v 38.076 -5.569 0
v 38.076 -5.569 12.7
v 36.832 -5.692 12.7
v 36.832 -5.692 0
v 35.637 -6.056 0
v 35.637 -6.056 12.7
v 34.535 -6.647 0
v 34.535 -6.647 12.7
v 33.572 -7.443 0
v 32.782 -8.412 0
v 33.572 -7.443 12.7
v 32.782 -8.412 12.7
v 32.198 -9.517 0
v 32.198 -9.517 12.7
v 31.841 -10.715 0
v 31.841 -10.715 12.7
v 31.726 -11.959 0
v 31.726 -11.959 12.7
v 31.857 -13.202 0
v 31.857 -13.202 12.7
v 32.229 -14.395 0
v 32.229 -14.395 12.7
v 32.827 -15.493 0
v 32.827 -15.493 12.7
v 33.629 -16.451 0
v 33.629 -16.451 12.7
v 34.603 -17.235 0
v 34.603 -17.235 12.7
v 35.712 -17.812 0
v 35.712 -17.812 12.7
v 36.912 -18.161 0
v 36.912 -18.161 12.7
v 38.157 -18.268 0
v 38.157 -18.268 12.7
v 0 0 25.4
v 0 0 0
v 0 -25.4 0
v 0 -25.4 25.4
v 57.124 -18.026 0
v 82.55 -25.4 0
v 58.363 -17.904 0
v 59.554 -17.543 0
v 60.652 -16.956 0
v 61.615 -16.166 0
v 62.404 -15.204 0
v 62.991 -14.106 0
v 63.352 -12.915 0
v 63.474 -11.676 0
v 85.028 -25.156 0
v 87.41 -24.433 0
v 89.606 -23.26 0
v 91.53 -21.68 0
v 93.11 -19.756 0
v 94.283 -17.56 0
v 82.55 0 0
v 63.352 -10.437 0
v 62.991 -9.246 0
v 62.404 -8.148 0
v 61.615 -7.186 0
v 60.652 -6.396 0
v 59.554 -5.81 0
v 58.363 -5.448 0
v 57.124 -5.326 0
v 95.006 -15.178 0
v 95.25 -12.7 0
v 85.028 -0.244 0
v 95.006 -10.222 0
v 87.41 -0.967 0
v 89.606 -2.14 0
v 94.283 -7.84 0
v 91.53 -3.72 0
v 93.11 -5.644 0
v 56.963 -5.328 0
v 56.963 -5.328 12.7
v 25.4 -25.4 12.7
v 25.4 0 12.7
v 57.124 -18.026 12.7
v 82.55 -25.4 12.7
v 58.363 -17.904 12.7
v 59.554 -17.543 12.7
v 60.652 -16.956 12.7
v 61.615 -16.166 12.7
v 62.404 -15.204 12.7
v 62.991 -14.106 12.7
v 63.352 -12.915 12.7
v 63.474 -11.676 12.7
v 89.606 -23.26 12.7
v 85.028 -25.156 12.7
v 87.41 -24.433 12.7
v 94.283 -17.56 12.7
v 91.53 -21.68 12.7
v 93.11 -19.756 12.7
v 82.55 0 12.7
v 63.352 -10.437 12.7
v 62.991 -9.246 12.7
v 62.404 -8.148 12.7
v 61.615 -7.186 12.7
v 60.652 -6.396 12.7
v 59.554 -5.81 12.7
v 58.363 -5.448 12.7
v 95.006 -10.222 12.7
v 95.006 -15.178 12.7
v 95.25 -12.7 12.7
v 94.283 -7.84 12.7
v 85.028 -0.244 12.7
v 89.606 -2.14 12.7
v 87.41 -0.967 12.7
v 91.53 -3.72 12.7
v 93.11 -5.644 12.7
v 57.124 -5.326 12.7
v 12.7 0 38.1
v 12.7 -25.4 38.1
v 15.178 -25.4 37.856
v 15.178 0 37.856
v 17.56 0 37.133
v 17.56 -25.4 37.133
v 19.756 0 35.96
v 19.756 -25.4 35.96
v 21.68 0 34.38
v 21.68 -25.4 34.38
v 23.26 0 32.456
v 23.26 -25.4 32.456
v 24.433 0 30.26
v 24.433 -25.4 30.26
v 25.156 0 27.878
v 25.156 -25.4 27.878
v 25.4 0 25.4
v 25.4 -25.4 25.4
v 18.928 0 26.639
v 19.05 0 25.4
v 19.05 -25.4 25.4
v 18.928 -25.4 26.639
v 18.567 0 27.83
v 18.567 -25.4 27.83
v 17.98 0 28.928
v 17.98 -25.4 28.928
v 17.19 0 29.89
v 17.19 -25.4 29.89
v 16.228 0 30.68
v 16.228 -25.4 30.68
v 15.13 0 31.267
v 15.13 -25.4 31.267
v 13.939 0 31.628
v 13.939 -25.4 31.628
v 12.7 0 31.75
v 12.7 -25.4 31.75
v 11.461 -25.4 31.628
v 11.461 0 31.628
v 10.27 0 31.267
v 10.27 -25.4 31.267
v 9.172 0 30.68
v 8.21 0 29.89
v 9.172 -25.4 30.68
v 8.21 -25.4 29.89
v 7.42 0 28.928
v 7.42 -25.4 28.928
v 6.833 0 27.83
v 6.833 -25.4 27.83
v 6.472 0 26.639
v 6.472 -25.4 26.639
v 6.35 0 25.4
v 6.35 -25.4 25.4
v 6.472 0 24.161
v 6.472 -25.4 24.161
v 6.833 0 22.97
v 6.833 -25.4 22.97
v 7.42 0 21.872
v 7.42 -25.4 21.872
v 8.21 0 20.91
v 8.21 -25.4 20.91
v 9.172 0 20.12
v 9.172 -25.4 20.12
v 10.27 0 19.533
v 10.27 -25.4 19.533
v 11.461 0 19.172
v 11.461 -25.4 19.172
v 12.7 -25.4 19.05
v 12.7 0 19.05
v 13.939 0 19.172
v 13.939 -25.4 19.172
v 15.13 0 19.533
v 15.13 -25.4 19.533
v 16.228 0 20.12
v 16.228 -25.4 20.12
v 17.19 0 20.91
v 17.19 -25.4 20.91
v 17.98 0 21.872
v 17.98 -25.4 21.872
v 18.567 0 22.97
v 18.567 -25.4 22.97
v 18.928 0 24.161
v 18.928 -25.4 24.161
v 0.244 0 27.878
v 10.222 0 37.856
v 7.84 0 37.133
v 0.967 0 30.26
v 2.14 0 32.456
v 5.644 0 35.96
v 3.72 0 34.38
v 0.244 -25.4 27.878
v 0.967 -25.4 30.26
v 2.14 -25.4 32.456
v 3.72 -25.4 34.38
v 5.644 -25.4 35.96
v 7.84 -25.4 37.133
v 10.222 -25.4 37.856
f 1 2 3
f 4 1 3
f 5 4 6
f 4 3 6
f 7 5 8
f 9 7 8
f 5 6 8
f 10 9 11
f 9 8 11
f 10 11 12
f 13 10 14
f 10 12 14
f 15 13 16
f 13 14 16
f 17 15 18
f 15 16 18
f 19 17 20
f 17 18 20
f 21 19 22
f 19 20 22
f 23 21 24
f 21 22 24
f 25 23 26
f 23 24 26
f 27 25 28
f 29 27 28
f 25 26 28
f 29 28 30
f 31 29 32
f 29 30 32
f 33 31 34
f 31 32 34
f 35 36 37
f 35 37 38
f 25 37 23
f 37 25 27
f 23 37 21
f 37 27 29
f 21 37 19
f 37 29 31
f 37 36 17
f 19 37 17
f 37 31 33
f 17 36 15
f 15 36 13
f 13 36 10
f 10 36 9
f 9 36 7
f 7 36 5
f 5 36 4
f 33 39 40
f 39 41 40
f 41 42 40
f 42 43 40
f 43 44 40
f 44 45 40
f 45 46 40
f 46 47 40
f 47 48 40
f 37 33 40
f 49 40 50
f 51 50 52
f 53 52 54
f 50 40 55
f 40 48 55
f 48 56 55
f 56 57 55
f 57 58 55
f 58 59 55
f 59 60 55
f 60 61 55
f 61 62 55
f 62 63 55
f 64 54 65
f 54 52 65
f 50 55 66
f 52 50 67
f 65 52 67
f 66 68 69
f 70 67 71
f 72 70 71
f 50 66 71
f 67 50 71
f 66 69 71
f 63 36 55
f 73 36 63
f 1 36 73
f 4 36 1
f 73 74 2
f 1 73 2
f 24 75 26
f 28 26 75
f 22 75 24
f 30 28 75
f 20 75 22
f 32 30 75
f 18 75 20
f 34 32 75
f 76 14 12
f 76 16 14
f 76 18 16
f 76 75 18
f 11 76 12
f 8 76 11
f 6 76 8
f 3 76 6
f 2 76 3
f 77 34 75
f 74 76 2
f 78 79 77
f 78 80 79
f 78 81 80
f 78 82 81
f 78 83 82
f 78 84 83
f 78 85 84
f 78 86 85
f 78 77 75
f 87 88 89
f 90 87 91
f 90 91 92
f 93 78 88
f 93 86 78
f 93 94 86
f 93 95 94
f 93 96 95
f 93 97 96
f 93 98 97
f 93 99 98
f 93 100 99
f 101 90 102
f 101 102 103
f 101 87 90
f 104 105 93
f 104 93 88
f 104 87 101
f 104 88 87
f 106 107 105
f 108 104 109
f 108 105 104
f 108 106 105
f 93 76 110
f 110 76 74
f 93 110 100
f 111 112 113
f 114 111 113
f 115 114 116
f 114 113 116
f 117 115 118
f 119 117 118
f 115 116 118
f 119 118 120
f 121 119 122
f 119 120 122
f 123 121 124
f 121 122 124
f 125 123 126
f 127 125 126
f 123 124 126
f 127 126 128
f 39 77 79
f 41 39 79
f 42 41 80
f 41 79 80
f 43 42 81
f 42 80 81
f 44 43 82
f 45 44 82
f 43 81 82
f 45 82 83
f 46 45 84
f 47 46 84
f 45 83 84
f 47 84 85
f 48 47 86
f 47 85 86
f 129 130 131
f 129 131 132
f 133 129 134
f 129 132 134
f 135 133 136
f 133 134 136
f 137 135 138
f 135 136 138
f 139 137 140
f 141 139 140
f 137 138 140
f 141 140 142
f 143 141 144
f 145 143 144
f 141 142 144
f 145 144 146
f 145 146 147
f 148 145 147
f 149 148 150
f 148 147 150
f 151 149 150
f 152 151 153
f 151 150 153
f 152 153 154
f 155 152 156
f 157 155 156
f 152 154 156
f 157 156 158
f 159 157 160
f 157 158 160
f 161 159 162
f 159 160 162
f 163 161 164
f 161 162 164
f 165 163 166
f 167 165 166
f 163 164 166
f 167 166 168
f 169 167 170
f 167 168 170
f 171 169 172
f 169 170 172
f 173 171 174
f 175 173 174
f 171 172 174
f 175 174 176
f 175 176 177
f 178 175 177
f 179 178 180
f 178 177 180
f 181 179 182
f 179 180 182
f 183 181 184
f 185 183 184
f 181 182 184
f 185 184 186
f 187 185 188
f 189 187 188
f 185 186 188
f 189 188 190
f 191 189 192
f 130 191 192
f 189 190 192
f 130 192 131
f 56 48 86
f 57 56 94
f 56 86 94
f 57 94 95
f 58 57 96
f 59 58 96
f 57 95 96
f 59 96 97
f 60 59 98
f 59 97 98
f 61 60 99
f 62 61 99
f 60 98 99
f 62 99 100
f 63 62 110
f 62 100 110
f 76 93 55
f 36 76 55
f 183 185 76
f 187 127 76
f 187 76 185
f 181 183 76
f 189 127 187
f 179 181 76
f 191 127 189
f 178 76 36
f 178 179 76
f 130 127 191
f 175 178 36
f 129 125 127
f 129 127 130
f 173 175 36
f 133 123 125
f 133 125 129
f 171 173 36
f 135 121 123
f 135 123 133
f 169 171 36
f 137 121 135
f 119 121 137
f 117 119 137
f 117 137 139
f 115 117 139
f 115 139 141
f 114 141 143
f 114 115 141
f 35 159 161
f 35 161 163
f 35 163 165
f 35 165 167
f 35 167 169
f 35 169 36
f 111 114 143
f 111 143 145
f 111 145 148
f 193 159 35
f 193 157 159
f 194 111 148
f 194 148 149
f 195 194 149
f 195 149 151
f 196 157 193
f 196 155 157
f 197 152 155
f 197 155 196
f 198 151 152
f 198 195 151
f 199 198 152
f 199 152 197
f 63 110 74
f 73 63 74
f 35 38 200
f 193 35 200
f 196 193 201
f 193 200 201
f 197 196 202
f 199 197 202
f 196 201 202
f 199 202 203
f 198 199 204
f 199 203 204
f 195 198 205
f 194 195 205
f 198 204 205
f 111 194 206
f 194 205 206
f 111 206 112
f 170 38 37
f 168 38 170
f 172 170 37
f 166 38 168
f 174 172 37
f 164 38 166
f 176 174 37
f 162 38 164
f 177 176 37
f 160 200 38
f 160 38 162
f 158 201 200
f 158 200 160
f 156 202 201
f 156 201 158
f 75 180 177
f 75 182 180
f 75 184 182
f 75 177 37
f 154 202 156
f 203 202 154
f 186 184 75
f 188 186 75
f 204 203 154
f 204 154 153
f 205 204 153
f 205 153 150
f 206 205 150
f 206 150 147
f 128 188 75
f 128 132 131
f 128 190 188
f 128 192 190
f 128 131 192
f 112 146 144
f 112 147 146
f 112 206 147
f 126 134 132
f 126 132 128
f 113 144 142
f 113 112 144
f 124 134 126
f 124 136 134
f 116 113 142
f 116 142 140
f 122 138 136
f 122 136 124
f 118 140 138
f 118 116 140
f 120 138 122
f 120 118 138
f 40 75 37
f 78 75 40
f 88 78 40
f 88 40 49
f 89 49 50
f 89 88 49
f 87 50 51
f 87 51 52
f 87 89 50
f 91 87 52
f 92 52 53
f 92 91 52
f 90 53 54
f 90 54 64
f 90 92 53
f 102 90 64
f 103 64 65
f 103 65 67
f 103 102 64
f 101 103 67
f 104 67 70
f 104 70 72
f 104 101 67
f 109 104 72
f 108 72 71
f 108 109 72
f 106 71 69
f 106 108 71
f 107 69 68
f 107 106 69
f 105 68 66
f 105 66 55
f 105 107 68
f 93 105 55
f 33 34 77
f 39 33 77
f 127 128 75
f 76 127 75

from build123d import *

# Parameters (mm, degrees)
F0_W     = 69.85
F0_H     = 38.1
F1_DEPTH = 25.4
F3_DEPTH = 25.4
F5_DEPTH = 12.7
F7_DEPTH = 25.4
F8_R     = 6.35
F9_DEPTH = 25.4


with BuildPart() as f1:
    # F0 (on Front) → F1 (new body)
    with BuildSketch(Plane.XZ):
        with Locations((34.925, 19.05)):
            Rectangle(F0_W, F0_H)
    extrude(amount=F1_DEPTH)

    # F2 (on face) → F3 (cut)
    with BuildSketch(Plane.XZ.offset(25.4)):
        with BuildLine():
            Line((0, 38.1), (0, 25.4))
            ThreePointArc((0, 25.4), (3.7197438789, 34.3802561211), (12.7, 38.1))
            Line((12.7, 38.1), (0, 38.1))
        make_face()
        with BuildLine():
            Line((69.85, 38.1), (12.7, 38.1))
            ThreePointArc((12.7, 38.1), (21.6802561211, 34.3802561211), (25.4, 25.4))
            Line((25.4, 25.4), (25.4, 12.7))
            Line((25.4, 12.7), (69.85, 12.7))
            Line((69.85, 12.7), (69.85, 38.1))
        make_face()
    extrude(amount=-F3_DEPTH, mode=Mode.SUBTRACT)

    # F4 (on face) → F5 (join)
    with BuildSketch(Plane.XY.offset(12.7)):
        with BuildLine():
            Line((69.85, -25.4), (82.55, -25.4))
            ThreePointArc((82.55, -25.4), (95.25, -12.7), (82.55, 0))
            Line((82.55, 0), (69.85, 0))
            Line((69.85, 0), (69.85, -25.4))
        make_face()
    extrude(amount=-F5_DEPTH)

    # F6 (on face) → F7 (cut)
    with BuildSketch(Plane.XY.offset(12.7)):
        with BuildLine():
            ThreePointArc((38.0759369288, -5.5685763133), (42.5660649893, -7.4284482528), (44.4259369288, -11.9185763133))
            ThreePointArc((44.4259369288, -11.9185763133), (42.5946024122, -16.3799844149), (38.1569094488, -18.2680600287))
            Line((38.1569094488, -18.2680600287), (57.1243946492, -18.0261748455))
            ThreePointArc((57.1243946492, -18.0261748455), (50.7749087424, -11.7569753348), (56.9628067538, -5.328231135))
            Line((56.9628067538, -5.328231135), (38.0759369288, -5.5685763133))
        make_face()
        with BuildLine():
            Line((57.1243946492, -5.3261748455), (56.9628067538, -5.328231135))
            ThreePointArc((56.9628067538, -5.328231135), (50.7749087424, -11.7569753348), (57.1243946492, -18.0261748455))
            ThreePointArc((57.1243946492, -18.0261748455), (61.6145227098, -16.1663029061), (63.4743946492, -11.6761748455))
            ThreePointArc((63.4743946492, -11.6761748455), (61.6145227098, -7.186046785), (57.1243946492, -5.3261748455))
        make_face()
        with BuildLine():
            ThreePointArc((38.1569094488, -18.2680600287), (42.5946024122, -16.3799844149), (44.4259369288, -11.9185763133))
            ThreePointArc((44.4259369288, -11.9185763133), (42.5660649893, -7.4284482528), (38.0759369288, -5.5685763133))
            ThreePointArc((38.0759369288, -5.5685763133), (31.7260660012, -11.9590633963), (38.1569094488, -18.2680600287))
        make_face()
    extrude(amount=-F7_DEPTH, mode=Mode.SUBTRACT)

    # F8 (on face) → F9 (cut)
    with BuildSketch(Plane.XZ.offset(25.4)):
        with Locations((12.7, 25.4)):
            Circle(F8_R)
    extrude(amount=-F9_DEPTH, mode=Mode.SUBTRACT)


solid = f1.part
